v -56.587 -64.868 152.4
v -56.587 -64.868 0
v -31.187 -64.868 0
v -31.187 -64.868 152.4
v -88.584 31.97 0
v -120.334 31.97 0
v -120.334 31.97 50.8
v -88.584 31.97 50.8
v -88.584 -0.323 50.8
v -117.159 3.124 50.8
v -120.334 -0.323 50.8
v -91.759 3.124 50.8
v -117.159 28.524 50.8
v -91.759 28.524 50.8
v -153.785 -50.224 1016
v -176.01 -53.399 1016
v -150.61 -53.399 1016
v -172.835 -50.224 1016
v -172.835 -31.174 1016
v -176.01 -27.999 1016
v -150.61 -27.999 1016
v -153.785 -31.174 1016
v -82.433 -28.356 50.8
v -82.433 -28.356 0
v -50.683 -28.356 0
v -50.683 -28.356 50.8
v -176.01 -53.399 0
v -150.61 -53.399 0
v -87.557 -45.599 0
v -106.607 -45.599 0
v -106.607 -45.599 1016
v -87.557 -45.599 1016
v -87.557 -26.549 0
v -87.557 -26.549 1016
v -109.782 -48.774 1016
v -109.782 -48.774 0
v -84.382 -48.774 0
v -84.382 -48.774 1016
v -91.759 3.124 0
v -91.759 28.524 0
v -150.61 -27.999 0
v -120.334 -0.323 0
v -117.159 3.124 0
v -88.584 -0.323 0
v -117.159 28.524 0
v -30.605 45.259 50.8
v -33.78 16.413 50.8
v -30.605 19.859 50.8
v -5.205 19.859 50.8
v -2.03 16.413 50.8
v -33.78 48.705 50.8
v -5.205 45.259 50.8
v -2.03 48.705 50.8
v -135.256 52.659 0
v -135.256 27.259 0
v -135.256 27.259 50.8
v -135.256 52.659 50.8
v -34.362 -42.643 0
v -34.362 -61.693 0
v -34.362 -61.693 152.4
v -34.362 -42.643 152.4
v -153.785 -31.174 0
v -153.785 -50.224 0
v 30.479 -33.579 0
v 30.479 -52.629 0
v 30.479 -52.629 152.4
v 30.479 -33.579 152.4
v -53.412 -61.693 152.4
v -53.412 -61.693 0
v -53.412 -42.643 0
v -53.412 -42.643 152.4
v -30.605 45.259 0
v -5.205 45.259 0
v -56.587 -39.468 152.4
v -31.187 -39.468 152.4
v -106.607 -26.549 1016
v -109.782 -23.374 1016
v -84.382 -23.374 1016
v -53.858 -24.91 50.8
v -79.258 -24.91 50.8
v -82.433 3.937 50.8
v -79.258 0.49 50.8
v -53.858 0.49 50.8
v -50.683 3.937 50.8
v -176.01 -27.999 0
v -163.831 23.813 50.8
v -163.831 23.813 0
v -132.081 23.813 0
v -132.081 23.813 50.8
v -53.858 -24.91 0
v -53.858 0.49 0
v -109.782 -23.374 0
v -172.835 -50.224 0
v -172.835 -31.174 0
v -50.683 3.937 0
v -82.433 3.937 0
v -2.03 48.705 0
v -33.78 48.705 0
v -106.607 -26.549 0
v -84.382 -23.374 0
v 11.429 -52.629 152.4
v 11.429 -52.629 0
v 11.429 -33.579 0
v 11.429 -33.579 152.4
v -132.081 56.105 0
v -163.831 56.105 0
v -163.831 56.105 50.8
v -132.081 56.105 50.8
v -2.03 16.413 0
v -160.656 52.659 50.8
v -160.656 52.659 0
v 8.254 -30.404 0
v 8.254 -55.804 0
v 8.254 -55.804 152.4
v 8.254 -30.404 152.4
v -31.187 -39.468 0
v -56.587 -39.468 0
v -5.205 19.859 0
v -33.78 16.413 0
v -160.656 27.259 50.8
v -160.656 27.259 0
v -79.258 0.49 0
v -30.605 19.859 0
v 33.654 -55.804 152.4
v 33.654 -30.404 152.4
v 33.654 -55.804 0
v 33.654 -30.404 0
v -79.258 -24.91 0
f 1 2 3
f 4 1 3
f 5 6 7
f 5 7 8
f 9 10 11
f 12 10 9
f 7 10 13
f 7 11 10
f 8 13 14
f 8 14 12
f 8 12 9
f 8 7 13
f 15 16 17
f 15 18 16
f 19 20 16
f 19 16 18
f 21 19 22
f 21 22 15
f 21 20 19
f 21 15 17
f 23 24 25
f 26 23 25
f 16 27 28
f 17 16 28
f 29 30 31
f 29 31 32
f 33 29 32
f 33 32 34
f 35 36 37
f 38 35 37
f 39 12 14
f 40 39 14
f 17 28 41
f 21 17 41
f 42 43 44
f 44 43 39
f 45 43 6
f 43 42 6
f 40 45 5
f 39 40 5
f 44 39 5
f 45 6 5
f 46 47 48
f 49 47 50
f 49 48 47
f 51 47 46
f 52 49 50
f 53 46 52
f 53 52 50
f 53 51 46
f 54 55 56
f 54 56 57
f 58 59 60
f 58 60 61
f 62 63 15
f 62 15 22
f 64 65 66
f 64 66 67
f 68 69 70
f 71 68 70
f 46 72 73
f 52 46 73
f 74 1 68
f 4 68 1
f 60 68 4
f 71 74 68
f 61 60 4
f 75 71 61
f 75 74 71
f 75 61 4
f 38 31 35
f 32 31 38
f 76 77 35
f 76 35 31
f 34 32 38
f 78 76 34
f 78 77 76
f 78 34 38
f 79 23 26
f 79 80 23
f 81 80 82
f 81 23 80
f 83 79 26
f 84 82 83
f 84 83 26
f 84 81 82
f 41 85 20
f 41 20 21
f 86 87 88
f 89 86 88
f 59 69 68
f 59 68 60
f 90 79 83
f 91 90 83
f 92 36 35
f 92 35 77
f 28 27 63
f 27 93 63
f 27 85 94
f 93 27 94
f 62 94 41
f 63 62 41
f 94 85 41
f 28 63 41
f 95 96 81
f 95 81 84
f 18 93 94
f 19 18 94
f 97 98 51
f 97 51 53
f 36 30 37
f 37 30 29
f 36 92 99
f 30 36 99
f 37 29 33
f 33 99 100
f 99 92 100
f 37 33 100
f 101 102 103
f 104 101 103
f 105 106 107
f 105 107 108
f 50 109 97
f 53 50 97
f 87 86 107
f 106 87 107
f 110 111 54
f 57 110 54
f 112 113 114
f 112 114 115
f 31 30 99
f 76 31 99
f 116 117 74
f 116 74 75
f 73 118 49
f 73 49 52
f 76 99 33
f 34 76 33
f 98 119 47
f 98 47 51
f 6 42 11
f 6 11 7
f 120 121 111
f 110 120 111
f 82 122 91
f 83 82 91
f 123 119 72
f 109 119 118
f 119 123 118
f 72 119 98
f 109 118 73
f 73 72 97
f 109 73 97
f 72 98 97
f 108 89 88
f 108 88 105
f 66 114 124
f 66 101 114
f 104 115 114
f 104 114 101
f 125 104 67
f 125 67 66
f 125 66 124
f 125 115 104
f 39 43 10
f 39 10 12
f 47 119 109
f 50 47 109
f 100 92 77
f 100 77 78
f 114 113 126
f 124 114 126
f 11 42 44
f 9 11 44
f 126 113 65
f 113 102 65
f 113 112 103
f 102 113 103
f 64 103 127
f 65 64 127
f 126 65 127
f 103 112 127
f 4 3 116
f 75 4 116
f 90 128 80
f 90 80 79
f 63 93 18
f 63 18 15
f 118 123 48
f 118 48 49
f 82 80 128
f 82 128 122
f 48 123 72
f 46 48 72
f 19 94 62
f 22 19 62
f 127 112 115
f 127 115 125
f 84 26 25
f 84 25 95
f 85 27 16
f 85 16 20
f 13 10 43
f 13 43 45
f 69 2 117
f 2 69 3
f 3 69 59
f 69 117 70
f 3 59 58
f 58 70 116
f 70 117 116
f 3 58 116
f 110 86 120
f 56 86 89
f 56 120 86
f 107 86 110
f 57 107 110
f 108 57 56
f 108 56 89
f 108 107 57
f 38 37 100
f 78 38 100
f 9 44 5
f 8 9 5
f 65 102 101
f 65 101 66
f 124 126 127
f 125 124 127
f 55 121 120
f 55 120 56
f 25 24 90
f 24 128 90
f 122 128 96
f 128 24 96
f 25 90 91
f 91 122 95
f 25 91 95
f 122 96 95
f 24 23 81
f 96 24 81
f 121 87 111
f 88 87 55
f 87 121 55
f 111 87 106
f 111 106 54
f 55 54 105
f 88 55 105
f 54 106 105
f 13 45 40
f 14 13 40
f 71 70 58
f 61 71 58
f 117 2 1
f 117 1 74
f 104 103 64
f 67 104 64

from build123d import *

# Parameters (mm, degrees)
F1_W      = 31.75
F1_H      = 32.292241
F1_W_2    = 25.4
F1_H_2    = 25.4
F0_W      = 31.75
F0_H      = 32.292241
F0_W_2    = 25.4
F0_H_2    = 25.4
F3_W      = 31.75
F3_H      = 32.292241
F3_W_2    = 25.4
F3_H_2    = 25.4
F2_W      = 31.75
F2_H      = 32.292241
F2_W_2    = 25.4
F2_H_2    = 25.4
F4_DEPTH  = 50.8
F8_W      = 25.4
F8_H      = 25.4
F8_W_2    = 19.05
F8_H_2    = 19.05
F7_W      = 25.4
F7_H      = 25.4
F7_W_2    = 19.05
F7_H_2    = 19.05
F9_DEPTH  = 152.4
F6_W      = 25.4
F6_H      = 25.4
F6_W_2    = 19.05
F6_H_2    = 19.05
F5_W      = 25.4
F5_H      = 25.4
F5_W_2    = 19.05
F5_H_2    = 19.05
F10_DEPTH = 1016


with BuildPart() as f4:
    # F1 (on Top) + F0 (on Top) + F3 (on Top) + F2 (on Top) → F4 (new body)
    with BuildSketch(Plane.XY):
        with Locations((-147.955775, 39.958753)):
            Rectangle(F1_W, F1_H)
        with Locations((-147.955775, 39.958753)):
            Rectangle(F1_W_2, F1_H_2, mode=Mode.SUBTRACT)
    with BuildSketch(Plane.XY):
        with Locations((-104.459423, 15.823613)):
            Rectangle(F0_W, F0_H)
        with Locations((-104.459423, 15.823613)):
            Rectangle(F0_W_2, F0_H_2, mode=Mode.SUBTRACT)
    with BuildSketch(Plane.XY):
        with Locations((-66.558324, -12.209618)):
            Rectangle(F3_W, F3_H)
        with Locations((-66.558324, -12.209618)):
            Rectangle(F3_W_2, F3_H_2, mode=Mode.SUBTRACT)
    with BuildSketch(Plane.XY):
        with Locations((-17.904842, 32.558982)):
            Rectangle(F2_W, F2_H)
        with Locations((-17.904842, 32.558981)):
            Rectangle(F2_W_2, F2_H_2, mode=Mode.SUBTRACT)
    extrude(amount=F4_DEPTH)


with BuildPart() as f9:
    # F8 (on Top) + F7 (on Top) → F9 (new body)
    with BuildSketch(Plane.XY):
        with Locations((20.954452, -43.10365)):
            Rectangle(F8_W, F8_H)
        with Locations((20.954452, -43.10365)):
            Rectangle(F8_W_2, F8_H_2, mode=Mode.SUBTRACT)
    with BuildSketch(Plane.XY):
        with Locations((-43.887019, -52.168373)):
            Rectangle(F7_W, F7_H)
        with Locations((-43.887019, -52.168373)):
            Rectangle(F7_W_2, F7_H_2, mode=Mode.SUBTRACT)
    extrude(amount=F9_DEPTH)


with BuildPart() as f10:
    # F6 (on Top) + F5 (on Top) → F10 (new body)
    with BuildSketch(Plane.XY):
        with Locations((-97.082369, -36.073875)):
            Rectangle(F6_W, F6_H)
        with Locations((-97.082369, -36.073875)):
            Rectangle(F6_W_2, F6_H_2, mode=Mode.SUBTRACT)
    with BuildSketch(Plane.XY):
        with Locations((-163.310304, -40.698729)):
            Rectangle(F5_W, F5_H)
        with Locations((-163.310304, -40.698729)):
            Rectangle(F5_W_2, F5_H_2, mode=Mode.SUBTRACT)
    extrude(amount=F10_DEPTH)


solid = Compound([f4.part, f9.part, f10.part])
